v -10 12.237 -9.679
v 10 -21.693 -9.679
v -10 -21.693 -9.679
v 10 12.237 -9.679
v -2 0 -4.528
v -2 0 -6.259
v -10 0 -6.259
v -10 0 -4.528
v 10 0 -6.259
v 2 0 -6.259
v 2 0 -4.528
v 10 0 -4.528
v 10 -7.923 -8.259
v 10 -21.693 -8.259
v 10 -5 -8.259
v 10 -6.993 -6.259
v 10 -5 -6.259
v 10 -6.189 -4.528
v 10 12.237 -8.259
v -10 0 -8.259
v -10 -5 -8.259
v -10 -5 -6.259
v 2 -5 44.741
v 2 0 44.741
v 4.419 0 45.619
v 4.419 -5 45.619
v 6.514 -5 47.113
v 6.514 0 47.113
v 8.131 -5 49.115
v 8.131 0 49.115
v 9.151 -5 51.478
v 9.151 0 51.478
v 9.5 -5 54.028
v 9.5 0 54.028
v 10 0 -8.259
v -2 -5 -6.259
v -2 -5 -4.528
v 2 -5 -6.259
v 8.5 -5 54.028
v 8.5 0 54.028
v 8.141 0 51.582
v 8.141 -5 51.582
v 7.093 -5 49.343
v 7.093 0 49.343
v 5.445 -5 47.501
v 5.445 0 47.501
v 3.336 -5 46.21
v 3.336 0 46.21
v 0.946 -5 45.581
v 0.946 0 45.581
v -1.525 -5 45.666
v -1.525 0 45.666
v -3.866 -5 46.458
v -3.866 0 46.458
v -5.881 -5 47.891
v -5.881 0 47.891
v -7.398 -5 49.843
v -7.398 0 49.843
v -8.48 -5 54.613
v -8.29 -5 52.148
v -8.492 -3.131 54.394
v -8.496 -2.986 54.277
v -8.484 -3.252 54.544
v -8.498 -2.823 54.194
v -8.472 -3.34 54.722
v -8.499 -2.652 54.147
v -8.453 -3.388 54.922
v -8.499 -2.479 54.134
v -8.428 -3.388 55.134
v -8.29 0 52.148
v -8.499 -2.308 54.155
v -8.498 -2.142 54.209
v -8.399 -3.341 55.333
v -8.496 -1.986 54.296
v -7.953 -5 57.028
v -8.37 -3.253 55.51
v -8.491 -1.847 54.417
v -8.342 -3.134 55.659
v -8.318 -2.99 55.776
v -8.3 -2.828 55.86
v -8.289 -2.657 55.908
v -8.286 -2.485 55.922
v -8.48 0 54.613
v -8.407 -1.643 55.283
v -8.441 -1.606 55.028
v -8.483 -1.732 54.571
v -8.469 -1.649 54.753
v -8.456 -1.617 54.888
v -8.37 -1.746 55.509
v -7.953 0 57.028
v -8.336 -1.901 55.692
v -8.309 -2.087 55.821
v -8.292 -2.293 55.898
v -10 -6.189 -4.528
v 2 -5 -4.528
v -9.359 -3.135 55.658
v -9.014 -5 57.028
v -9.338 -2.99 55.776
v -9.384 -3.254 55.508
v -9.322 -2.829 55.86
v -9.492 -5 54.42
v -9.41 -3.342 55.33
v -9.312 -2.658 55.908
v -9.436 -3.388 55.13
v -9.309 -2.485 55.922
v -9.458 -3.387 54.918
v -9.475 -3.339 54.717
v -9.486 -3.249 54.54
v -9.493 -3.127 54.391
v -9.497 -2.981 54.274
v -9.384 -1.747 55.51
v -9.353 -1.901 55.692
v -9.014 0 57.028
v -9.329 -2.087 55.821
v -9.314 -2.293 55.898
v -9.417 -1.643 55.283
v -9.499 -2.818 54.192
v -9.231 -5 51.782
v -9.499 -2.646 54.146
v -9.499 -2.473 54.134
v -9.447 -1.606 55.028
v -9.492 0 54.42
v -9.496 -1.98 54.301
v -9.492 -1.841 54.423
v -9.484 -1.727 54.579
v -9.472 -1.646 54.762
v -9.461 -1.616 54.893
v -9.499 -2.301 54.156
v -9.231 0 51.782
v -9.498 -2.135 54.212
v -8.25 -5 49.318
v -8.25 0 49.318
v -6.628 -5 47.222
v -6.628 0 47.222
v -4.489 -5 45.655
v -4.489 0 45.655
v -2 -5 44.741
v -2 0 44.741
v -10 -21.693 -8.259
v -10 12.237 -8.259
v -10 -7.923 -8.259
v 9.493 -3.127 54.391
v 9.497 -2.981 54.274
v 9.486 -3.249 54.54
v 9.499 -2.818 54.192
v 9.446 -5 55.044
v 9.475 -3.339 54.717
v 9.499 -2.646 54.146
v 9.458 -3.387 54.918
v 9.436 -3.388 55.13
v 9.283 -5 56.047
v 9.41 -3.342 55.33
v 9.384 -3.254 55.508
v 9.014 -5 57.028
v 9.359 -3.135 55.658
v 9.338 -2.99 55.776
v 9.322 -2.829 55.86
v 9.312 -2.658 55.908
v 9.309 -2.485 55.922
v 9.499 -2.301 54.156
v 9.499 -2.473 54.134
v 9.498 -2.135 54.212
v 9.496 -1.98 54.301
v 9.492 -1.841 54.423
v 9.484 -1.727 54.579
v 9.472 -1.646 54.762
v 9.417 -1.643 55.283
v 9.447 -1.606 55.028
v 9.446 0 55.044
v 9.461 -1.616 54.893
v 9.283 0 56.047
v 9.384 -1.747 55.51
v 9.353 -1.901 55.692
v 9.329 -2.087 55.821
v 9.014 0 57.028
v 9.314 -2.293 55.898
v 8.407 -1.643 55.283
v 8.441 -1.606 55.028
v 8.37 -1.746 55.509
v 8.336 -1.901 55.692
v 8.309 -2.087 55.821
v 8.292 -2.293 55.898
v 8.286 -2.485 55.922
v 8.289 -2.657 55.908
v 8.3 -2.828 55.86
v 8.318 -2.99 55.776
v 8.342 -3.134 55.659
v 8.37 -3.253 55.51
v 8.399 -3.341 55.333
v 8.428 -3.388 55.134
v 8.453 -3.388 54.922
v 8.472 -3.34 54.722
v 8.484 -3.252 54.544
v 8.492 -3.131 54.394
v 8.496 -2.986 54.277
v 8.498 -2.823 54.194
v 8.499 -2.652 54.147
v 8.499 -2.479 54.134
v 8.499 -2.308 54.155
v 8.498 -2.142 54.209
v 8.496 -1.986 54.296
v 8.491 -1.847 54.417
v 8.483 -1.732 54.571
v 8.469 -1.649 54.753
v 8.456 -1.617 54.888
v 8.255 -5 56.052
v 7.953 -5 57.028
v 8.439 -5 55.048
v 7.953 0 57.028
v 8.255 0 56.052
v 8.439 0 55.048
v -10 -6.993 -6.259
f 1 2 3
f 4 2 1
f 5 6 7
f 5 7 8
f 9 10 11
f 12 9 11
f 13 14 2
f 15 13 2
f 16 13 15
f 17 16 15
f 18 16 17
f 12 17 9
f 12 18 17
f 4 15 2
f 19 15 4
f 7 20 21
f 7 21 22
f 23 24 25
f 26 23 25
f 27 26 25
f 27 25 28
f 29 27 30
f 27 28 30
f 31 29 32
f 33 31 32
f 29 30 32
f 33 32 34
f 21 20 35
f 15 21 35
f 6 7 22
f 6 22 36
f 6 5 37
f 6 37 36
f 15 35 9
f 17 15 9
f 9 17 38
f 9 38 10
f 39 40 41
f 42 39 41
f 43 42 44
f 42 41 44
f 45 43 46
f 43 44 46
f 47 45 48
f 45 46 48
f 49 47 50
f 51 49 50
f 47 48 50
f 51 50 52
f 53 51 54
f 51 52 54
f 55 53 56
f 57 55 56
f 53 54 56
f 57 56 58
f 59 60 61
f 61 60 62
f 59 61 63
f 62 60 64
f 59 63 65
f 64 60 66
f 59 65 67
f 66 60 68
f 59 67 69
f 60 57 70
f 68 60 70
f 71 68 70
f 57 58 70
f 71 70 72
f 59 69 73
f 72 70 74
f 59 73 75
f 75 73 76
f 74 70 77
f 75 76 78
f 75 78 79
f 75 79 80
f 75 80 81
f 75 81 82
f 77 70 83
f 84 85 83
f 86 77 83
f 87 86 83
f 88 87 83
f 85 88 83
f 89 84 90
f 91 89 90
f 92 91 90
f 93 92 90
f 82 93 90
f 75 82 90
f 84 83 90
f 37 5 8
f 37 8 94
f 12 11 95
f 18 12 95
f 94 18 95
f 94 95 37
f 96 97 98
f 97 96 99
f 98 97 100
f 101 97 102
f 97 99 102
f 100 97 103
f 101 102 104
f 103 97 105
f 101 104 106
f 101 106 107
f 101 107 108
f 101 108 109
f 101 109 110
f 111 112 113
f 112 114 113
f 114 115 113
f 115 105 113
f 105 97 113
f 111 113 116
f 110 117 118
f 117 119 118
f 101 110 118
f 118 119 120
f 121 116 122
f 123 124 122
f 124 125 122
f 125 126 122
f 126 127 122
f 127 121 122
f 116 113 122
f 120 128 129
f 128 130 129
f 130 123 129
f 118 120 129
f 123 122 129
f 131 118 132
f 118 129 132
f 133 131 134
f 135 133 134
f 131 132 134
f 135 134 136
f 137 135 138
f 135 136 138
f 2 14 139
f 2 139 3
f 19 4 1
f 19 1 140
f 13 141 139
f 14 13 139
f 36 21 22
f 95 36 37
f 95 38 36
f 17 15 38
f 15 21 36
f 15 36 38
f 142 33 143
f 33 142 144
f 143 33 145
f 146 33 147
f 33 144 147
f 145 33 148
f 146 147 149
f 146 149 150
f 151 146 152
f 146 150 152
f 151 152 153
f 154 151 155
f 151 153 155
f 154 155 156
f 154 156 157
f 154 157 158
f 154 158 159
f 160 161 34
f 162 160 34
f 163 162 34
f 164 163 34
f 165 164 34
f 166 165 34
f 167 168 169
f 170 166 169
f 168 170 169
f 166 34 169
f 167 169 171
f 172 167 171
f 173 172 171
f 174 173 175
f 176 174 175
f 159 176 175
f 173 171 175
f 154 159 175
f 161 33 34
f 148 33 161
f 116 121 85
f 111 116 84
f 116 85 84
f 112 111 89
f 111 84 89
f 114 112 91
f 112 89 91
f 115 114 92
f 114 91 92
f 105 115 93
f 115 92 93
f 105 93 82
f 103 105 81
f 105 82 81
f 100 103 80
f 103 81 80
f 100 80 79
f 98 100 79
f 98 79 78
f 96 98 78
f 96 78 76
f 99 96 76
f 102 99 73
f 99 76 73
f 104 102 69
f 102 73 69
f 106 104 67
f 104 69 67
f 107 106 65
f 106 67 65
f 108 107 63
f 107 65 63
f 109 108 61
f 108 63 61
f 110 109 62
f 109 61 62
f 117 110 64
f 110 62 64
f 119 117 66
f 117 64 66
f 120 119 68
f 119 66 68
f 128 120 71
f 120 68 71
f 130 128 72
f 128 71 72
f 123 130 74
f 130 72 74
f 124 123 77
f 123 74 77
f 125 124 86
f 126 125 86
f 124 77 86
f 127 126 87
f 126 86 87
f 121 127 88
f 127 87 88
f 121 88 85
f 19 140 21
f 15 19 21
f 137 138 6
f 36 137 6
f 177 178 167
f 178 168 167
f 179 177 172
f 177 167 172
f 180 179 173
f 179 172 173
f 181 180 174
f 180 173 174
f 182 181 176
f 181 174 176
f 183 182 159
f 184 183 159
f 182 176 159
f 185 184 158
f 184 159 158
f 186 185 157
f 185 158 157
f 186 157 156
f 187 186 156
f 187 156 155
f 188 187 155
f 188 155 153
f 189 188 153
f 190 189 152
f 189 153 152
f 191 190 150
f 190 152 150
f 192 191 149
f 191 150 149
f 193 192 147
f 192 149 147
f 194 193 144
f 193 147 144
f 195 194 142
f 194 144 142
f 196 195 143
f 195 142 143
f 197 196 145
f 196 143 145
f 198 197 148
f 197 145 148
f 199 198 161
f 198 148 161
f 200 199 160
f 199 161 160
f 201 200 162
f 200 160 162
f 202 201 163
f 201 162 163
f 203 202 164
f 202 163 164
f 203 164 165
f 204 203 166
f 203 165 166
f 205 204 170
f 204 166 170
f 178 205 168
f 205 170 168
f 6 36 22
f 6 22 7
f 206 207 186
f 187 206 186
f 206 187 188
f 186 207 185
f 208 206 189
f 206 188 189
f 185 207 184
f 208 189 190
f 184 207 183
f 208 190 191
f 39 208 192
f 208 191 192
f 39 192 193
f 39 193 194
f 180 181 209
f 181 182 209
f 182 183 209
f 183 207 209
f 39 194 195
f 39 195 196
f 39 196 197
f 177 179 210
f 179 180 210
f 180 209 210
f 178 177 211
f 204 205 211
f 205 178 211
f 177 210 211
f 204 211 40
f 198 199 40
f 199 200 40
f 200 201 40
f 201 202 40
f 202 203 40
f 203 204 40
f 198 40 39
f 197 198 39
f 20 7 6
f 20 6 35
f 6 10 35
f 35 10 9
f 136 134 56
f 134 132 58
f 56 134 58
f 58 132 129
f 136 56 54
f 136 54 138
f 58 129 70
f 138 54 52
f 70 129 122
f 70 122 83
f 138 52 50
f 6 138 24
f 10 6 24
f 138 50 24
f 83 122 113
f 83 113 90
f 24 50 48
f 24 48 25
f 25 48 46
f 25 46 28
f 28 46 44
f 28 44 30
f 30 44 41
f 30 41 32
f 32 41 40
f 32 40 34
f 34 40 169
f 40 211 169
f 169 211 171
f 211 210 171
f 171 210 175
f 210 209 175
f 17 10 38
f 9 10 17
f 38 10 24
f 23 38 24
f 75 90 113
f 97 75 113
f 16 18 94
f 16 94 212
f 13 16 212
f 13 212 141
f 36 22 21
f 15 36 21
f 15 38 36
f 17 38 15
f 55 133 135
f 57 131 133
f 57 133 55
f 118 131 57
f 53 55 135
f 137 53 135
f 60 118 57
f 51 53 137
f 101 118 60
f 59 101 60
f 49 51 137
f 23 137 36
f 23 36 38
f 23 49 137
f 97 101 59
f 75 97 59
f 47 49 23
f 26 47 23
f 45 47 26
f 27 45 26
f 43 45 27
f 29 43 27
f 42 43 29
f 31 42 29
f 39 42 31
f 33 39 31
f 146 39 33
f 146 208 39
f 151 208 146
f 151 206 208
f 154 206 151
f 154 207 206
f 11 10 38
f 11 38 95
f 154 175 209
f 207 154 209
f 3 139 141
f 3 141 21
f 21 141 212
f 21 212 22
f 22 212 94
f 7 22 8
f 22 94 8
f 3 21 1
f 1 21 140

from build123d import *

# Parameters (mm, degrees)
F0_W     = 4
F0_H     = 43
F0_W_2   = 8
F0_H_2   = 2
F1_DEPTH = 5
F3_DEPTH = 20
F5_R     = 0.8942590534
F6_DEPTH = 12.5


with BuildPart() as f1:
    # F0 (on Front) → F1 (new body)
    with BuildSketch(Plane.XZ):
        with BuildLine():
            ThreePointArc((2, 44.7409739319), (0, 44.5280617424), (-2, 44.7409739319))
            Line((-2, 44.7409739319), (-2, 36.7409739319))
            Line((-2, 36.7409739319), (2, 36.7409739319))
            Line((2, 36.7409739319), (2, 44.7409739319))
        make_face()
        with BuildLine():
            ThreePointArc((7.9529868603, 57.0280617424), (8.3621285661, 55.5527931429), (8.5, 54.0280617424))
            ThreePointArc((8.5, 54.0280617424), (-1.5247314005, 45.6659331763), (-7.9529868603, 57.0280617424))
            Line((-7.9529868603, 57.0280617424), (-9.0138781887, 57.0280617424))
            ThreePointArc((-9.0138781887, 57.0280617424), (-8.2504248318, 49.318444975), (-2, 44.7409739319))
            ThreePointArc((-2, 44.7409739319), (0, 44.5280617424), (2, 44.7409739319))
            ThreePointArc((2, 44.7409739319), (7.3908727495, 48.0593935492), (9.5, 54.0280617424))
            ThreePointArc((9.5, 54.0280617424), (9.3776820908, 55.5476270104), (9.0138781887, 57.0280617424))
            Line((9.0138781887, 57.0280617424), (7.9529868603, 57.0280617424))
        make_face()
        with Locations((0, 15.2409739319)):
            Rectangle(F0_W, F0_H)
        with Locations((6, -7.2590260681)):
            Rectangle(F0_W_2, F0_H_2)
        with Locations((0, -7.2590260681)):
            Rectangle(F0_W, F0_H_2)
        with Locations((-6, -7.2590260681)):
            Rectangle(F0_W_2, F0_H_2)
    extrude(amount=F1_DEPTH)


with BuildPart() as f3:
    # F2 (on face) → F3 (new body)
    with BuildSketch(Plane.YZ.offset(10)):
        Polygon((12.2371204197, -9.6794357523), (12.2371204197, -8.2590260681), (0, -8.2590260681), (-5, -8.2590260681), (-7.9226046801, -8.2590260681), (-21.6926392168, -8.2590260681), (-21.6926392168, -9.6794357523), align=None)
        Polygon((-5, -8.2590260681), (-5, -6.2590260681), (-6.9932822321, -6.2590260681), (-7.9226046801, -8.2590260681), align=None)
        Polygon((-5, -6.2590260681), (0, -6.2590260681), (0, -4.5280563645), (-6.1889677308, -4.5280563645), (-6.9932822321, -6.2590260681), align=None)
    extrude(amount=-F3_DEPTH)

    # F4: cut F1
    add(f1.part, mode=Mode.SUBTRACT)


with BuildPart() as f1_1:
    add(f1.part)

    # F5 (on Right) → F6 (cut, symmetric)
    with BuildSketch(Plane.YZ):
        with Locations((-2.5, 55.0280617424)):
            Circle(F5_R)
    extrude(amount=F6_DEPTH, both=True, mode=Mode.SUBTRACT)


solid = Compound([f3.part, f1_1.part])
